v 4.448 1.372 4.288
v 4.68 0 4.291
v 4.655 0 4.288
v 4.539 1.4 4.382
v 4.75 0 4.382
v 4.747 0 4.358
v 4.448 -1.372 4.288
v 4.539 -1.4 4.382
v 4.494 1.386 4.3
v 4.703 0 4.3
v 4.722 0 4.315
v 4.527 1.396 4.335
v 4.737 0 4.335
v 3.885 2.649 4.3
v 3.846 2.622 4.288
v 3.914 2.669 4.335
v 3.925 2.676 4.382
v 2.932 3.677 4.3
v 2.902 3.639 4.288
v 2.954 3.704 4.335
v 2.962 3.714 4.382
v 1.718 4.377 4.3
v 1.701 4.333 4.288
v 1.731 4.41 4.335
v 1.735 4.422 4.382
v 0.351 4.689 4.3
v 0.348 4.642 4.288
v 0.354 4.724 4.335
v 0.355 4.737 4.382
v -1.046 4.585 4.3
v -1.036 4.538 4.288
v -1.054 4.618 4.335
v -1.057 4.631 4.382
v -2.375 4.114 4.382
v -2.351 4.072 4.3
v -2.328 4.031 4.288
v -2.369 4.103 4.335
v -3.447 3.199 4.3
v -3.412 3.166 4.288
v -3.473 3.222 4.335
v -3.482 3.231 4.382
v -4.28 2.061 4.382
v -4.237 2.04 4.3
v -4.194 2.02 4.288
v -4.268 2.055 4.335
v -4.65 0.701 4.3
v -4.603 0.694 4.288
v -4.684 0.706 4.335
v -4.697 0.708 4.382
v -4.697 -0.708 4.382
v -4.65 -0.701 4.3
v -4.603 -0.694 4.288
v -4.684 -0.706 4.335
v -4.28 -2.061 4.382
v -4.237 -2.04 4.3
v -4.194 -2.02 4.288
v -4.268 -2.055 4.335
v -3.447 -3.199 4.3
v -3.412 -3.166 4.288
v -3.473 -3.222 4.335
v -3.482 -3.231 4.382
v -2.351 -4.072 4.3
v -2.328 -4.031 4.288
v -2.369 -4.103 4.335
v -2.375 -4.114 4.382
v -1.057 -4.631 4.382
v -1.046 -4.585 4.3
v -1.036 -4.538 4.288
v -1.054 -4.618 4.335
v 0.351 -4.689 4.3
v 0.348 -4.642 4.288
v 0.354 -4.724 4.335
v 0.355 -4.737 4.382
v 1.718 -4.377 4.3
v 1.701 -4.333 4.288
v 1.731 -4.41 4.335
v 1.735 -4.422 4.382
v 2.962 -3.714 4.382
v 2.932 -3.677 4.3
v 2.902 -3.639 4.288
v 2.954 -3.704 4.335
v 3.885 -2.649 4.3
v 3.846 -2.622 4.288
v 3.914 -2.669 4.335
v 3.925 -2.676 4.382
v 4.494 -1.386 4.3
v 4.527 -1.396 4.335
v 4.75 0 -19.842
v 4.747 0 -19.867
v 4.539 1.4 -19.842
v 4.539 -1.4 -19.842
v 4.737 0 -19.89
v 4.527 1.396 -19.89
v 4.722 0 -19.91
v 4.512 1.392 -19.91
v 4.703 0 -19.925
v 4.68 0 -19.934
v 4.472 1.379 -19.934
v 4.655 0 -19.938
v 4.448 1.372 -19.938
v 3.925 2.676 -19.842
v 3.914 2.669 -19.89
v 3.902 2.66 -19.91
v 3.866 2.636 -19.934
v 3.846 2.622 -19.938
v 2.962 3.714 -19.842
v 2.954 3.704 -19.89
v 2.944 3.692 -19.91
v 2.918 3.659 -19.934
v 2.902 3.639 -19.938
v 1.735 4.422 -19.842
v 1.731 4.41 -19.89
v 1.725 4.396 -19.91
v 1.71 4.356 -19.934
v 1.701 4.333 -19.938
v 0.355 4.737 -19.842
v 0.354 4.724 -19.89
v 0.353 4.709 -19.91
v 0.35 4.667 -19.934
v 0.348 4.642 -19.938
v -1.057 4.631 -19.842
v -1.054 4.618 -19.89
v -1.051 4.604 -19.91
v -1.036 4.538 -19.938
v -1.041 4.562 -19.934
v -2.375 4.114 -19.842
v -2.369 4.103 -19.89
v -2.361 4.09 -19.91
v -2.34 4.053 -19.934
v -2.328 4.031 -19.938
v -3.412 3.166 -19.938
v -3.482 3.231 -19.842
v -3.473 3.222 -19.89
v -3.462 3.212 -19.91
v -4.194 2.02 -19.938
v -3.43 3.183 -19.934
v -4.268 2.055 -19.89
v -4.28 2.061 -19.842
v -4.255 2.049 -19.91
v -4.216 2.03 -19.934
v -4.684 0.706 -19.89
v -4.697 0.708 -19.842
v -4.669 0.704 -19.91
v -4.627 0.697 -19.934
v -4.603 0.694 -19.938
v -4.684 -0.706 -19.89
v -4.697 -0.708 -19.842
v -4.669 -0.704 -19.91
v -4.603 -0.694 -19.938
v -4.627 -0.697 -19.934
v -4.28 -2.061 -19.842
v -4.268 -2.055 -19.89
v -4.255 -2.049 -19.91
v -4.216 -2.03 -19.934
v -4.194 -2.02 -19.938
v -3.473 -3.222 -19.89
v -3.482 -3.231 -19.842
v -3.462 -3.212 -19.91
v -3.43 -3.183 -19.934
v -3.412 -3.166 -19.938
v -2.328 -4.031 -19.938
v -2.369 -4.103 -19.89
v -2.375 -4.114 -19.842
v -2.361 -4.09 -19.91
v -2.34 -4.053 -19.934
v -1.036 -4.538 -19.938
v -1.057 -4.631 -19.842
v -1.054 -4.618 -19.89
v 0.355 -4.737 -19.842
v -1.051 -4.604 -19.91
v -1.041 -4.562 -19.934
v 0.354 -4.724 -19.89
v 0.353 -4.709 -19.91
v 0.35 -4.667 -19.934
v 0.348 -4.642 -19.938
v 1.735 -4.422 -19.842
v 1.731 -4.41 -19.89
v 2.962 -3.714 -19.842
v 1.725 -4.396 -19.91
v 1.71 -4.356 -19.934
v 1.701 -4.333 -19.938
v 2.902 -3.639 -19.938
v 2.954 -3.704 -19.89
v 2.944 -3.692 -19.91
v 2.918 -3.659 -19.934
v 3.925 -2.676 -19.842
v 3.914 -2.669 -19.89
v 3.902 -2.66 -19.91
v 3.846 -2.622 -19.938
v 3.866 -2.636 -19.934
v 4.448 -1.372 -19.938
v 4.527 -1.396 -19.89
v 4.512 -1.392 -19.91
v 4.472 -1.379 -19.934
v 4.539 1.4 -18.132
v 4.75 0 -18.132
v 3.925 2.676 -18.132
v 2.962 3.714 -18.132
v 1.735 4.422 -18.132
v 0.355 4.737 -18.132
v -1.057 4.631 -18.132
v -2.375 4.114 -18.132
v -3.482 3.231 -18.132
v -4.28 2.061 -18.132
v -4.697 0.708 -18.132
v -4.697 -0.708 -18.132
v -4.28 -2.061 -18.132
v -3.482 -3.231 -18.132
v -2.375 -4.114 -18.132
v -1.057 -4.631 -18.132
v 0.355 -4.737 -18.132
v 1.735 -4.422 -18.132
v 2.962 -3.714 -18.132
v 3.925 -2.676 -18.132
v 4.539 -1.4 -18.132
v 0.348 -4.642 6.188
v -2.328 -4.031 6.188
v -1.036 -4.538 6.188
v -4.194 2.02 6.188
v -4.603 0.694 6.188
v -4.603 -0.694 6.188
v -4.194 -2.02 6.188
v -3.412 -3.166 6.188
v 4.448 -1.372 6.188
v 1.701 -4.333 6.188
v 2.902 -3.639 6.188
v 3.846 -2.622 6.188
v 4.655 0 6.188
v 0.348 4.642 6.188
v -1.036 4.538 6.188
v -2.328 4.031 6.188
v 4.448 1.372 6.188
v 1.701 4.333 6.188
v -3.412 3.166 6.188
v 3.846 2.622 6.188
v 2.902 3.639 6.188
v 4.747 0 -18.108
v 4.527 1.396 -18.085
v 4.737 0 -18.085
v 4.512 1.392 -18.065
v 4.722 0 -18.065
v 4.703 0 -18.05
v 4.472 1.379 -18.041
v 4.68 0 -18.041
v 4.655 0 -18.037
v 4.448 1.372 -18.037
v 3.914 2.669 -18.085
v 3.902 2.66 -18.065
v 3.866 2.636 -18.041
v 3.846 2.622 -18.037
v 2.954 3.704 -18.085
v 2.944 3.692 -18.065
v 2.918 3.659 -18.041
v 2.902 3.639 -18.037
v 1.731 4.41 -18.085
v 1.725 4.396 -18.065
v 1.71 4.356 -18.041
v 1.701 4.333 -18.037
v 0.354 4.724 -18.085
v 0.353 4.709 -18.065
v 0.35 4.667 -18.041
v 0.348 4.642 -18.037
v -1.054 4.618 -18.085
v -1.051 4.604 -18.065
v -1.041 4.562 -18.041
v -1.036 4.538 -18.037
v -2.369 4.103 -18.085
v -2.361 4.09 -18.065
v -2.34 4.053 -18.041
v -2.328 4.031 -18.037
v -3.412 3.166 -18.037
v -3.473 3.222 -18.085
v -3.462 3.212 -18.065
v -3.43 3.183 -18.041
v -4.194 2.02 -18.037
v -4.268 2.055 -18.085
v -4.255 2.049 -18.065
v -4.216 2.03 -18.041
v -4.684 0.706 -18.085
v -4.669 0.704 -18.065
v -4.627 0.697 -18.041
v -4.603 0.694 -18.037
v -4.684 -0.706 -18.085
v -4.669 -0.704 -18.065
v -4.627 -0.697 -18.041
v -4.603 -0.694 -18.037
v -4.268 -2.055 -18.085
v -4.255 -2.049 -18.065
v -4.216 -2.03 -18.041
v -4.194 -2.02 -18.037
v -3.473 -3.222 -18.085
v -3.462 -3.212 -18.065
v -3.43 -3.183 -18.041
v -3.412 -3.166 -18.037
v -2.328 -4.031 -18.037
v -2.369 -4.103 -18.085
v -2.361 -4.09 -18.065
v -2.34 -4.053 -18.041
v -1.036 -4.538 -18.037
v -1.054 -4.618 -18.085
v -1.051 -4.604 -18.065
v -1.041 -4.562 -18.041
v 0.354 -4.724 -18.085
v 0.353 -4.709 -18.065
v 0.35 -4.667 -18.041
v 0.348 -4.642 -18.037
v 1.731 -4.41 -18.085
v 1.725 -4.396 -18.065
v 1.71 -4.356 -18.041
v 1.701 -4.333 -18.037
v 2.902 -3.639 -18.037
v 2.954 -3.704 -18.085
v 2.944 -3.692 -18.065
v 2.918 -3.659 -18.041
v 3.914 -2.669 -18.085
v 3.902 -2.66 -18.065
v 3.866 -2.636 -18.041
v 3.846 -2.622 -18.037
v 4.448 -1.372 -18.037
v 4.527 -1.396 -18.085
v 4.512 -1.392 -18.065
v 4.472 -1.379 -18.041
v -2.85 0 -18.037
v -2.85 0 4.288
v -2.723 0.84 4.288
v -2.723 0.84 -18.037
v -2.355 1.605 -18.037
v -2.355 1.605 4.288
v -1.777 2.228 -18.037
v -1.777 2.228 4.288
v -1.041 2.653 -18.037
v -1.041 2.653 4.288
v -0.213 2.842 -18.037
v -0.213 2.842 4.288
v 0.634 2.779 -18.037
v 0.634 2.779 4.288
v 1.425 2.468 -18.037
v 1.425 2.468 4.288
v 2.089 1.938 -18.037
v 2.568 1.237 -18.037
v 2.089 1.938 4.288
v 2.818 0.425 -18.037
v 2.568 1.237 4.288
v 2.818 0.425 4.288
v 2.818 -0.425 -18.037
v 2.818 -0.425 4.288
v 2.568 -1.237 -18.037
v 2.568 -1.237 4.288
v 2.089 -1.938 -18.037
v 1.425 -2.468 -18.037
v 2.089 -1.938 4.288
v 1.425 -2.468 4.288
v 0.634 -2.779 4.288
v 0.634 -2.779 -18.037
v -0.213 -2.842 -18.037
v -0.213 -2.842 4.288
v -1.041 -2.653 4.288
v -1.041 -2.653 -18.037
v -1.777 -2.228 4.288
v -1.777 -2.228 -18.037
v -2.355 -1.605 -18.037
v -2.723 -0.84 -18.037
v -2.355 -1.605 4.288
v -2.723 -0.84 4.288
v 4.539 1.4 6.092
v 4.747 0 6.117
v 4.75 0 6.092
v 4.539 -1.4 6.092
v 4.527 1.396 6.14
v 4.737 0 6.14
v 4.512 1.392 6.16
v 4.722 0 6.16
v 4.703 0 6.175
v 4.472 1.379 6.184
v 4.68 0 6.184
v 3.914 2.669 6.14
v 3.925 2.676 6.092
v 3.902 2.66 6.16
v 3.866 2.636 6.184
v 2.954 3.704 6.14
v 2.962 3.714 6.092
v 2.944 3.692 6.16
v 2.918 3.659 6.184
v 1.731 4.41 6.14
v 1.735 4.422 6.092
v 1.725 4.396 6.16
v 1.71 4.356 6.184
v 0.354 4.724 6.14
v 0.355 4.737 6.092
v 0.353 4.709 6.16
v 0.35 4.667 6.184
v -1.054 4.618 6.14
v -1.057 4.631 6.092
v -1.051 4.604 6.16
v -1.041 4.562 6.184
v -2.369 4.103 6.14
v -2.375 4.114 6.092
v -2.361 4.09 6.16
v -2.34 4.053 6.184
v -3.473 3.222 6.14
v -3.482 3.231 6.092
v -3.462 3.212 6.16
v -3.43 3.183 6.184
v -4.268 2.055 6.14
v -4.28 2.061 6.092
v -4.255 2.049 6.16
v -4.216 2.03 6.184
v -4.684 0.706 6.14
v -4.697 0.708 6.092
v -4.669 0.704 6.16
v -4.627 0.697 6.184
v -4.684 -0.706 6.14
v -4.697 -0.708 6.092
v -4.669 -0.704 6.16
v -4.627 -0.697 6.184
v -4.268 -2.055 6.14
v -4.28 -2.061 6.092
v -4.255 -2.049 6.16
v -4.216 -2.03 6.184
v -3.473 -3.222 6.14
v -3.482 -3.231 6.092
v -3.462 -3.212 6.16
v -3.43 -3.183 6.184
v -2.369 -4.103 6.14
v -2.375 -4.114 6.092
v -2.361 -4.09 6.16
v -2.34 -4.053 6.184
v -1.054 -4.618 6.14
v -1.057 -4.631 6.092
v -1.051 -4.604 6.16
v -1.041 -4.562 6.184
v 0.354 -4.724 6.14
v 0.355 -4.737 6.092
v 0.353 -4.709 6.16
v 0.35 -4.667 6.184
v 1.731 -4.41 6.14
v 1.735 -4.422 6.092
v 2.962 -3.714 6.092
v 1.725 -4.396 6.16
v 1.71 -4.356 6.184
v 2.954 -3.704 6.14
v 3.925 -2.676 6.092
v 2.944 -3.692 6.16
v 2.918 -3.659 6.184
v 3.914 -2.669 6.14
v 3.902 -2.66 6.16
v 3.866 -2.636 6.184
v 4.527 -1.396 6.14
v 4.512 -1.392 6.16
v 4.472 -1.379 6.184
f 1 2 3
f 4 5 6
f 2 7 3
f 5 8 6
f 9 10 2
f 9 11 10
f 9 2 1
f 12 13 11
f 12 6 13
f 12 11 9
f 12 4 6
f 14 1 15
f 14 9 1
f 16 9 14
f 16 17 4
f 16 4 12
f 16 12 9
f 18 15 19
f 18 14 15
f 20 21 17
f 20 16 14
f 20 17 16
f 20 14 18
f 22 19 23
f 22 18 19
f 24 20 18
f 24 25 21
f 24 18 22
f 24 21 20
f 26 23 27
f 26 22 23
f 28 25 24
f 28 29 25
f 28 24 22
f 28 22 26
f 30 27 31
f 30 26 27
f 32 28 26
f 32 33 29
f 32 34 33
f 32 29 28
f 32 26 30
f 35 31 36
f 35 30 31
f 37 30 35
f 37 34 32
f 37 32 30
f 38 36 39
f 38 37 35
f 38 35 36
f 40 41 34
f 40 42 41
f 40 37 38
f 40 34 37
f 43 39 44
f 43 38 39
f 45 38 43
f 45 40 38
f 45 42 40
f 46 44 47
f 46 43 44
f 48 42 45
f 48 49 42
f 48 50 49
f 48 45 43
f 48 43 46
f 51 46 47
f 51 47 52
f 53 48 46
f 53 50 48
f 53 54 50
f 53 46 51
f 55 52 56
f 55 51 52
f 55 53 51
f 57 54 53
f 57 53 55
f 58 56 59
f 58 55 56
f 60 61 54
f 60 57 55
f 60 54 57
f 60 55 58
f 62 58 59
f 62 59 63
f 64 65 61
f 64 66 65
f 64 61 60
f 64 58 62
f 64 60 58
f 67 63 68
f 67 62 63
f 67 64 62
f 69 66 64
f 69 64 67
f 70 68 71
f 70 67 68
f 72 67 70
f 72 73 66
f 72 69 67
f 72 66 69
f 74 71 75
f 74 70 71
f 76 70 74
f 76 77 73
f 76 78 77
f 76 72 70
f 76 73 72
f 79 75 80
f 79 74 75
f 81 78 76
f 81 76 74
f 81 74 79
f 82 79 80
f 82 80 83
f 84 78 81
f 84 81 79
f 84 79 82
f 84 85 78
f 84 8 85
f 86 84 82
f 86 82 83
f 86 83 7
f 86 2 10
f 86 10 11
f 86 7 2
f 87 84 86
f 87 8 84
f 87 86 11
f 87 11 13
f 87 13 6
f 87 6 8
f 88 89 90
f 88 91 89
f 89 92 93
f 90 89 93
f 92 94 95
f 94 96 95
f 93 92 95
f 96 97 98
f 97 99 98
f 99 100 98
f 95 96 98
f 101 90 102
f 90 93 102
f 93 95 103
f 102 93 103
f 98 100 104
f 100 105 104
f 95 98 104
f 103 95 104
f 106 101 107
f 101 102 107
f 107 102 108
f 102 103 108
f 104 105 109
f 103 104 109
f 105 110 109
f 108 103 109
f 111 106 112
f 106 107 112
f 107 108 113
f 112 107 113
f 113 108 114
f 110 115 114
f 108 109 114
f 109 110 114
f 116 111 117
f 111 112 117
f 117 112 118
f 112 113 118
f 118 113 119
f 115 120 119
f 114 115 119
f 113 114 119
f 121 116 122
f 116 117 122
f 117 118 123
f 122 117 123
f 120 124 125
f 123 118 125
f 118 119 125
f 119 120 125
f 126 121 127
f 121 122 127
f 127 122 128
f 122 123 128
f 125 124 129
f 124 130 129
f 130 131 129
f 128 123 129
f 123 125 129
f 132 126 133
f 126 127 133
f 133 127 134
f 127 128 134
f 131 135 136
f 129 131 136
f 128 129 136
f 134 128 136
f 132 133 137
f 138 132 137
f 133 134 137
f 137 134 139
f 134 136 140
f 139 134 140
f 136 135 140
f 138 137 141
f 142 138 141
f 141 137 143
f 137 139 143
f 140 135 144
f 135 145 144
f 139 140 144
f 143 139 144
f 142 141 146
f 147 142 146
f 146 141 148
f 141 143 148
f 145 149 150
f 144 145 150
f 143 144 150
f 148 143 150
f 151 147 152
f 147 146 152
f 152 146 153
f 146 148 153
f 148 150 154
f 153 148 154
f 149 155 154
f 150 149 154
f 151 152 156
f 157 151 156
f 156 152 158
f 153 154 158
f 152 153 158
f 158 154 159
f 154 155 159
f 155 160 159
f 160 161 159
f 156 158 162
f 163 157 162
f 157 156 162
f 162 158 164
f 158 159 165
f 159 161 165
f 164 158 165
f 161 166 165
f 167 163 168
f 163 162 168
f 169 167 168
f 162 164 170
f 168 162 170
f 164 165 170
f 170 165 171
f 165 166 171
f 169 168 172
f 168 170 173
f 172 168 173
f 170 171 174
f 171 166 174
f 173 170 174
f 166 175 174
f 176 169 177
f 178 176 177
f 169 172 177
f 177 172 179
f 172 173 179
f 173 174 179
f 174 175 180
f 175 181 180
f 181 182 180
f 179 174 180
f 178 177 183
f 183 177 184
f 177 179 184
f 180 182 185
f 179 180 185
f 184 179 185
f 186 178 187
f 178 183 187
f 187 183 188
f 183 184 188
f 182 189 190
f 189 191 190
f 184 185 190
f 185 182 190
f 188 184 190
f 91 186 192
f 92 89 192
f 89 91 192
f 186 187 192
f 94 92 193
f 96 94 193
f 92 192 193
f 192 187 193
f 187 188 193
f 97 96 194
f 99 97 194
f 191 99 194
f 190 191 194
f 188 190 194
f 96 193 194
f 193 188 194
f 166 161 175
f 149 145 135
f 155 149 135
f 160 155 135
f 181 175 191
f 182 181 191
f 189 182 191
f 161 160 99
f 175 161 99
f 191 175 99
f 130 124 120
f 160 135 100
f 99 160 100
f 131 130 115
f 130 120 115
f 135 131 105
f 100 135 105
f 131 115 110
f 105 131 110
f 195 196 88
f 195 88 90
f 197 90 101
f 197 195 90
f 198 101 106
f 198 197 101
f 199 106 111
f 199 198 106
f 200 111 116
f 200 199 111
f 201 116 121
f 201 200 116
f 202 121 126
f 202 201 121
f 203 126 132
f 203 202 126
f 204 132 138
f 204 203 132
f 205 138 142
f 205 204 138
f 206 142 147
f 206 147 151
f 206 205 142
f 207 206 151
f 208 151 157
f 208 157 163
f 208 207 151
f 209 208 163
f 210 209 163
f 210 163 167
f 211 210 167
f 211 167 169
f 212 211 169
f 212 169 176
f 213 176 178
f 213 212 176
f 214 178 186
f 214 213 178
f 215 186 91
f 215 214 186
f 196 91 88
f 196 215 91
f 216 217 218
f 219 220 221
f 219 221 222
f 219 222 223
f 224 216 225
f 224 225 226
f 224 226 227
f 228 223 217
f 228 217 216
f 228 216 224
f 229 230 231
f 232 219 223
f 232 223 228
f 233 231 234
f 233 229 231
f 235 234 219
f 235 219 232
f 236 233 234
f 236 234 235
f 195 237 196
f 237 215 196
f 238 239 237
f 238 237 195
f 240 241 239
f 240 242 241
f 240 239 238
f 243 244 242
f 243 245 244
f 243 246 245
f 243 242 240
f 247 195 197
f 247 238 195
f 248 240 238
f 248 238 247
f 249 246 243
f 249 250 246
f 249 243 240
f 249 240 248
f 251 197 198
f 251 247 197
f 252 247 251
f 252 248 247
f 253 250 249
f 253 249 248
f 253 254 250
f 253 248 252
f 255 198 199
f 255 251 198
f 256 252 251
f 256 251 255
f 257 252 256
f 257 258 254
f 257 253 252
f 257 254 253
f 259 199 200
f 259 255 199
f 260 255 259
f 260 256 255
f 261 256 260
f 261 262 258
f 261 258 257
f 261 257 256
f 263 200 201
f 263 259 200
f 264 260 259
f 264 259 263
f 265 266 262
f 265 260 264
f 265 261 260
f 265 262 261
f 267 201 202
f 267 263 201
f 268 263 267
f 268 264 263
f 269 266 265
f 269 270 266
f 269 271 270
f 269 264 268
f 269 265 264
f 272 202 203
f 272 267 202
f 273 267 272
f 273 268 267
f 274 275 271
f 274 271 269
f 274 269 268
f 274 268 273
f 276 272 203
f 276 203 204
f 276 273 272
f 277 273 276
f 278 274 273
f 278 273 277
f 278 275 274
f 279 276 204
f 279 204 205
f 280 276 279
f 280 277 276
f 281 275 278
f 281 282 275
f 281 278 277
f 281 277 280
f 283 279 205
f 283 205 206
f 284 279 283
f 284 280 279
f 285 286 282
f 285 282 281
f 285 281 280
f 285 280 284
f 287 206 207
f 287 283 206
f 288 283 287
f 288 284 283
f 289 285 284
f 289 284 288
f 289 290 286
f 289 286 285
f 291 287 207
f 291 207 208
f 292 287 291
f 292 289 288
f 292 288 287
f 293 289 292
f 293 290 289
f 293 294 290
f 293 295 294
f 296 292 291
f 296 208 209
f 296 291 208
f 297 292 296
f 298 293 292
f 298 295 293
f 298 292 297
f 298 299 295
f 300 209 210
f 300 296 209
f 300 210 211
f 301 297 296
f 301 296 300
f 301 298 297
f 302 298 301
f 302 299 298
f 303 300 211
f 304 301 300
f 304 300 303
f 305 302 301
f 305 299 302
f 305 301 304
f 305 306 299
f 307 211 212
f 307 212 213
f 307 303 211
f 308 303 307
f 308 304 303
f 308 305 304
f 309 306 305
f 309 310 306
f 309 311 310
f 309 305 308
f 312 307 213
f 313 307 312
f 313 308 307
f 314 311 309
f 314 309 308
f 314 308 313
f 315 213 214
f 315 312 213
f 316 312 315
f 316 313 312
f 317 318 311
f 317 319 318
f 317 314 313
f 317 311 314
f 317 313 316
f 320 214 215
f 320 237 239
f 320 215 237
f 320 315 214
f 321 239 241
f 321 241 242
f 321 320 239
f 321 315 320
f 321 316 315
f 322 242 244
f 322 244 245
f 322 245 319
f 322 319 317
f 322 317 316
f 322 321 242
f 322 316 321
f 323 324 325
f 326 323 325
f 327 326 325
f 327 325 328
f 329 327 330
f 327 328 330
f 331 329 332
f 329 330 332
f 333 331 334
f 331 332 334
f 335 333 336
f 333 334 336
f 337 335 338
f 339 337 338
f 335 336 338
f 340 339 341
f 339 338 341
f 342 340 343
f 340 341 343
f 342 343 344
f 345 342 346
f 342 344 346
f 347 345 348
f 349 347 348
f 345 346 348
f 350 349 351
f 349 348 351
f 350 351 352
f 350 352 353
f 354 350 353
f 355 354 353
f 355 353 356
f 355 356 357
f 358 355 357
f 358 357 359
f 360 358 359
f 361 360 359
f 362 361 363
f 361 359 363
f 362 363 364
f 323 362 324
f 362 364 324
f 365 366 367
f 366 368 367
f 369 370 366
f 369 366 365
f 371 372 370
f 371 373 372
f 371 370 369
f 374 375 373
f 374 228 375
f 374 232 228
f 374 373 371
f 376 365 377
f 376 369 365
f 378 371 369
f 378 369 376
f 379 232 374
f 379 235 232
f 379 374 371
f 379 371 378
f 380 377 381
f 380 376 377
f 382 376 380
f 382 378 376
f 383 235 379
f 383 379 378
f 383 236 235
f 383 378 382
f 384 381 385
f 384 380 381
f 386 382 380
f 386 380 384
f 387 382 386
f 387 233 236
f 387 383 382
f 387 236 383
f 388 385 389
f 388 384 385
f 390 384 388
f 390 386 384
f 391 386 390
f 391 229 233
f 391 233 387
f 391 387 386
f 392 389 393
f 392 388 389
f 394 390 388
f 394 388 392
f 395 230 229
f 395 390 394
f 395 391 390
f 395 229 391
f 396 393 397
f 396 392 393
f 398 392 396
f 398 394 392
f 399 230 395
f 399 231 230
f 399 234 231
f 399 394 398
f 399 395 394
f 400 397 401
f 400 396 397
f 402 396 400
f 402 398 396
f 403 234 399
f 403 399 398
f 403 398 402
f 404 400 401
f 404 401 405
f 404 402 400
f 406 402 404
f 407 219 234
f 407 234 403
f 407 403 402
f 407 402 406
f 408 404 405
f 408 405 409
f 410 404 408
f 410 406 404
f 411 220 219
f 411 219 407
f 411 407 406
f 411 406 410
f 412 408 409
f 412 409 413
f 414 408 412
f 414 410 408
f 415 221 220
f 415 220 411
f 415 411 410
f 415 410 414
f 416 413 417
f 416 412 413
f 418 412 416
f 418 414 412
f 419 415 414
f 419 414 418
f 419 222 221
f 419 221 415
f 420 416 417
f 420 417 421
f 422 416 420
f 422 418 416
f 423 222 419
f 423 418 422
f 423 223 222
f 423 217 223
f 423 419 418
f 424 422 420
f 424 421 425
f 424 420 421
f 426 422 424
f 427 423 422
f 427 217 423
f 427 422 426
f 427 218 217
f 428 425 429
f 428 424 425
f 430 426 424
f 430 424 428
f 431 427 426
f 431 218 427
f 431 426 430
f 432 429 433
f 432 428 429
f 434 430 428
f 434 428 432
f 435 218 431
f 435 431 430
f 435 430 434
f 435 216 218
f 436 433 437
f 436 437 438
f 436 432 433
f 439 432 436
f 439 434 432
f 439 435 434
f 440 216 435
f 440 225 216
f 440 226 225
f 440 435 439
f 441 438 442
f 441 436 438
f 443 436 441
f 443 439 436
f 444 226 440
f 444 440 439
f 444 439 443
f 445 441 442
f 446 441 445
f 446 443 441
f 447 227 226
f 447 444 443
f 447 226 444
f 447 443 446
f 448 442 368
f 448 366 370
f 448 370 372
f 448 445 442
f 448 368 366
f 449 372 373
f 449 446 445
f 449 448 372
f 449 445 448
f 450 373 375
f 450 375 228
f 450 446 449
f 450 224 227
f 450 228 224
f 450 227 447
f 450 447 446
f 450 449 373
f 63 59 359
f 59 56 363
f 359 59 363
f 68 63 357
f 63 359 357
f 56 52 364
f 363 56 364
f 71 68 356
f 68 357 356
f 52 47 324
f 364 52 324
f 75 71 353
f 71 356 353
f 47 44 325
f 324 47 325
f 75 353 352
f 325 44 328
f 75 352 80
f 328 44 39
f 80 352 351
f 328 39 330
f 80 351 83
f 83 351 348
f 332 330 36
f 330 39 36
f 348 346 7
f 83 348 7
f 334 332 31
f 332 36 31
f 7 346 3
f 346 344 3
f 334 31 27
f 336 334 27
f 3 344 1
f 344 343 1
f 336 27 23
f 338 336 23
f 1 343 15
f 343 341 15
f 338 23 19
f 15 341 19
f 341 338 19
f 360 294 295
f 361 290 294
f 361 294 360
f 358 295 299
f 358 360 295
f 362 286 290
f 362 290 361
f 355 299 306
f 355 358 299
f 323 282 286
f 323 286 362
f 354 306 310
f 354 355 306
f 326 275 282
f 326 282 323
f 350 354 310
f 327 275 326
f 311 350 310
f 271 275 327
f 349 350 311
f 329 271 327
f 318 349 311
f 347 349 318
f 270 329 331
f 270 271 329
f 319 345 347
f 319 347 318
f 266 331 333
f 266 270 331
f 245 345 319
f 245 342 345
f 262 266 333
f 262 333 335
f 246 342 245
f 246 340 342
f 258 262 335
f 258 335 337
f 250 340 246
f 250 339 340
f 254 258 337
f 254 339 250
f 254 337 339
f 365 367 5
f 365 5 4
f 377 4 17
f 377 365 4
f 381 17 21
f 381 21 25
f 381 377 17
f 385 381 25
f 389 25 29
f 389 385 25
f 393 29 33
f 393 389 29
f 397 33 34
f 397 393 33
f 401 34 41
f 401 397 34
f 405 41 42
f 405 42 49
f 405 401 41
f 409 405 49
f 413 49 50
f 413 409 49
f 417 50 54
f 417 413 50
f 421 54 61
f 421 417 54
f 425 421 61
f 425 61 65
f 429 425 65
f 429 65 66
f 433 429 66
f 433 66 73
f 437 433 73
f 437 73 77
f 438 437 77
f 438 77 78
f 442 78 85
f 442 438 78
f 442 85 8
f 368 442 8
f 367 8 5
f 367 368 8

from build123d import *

# Parameters (mm, degrees)
SKETCH1_R           = 2.5
BOSS_EXTRUDE1_DEPTH = 1
SKETCH2_R           = 1.5
BOSS_EXTRUDE2_DEPTH = 11.75
BOSS_EXTRUDE3_START = -12.75
SKETCH1_5_R         = 2.5
BOSS_EXTRUDE3_DEPTH = 1
FILLET1_R           = 0.05
SCALE1_SCALE        = 1.9


with BuildPart() as part:
    # Sketch1 → Boss-Extrude1 (new body)
    with BuildSketch(Plane.XY):
        Circle(SKETCH1_R)
    extrude(amount=-BOSS_EXTRUDE1_DEPTH)

    # Sketch2 → Boss-Extrude2 (add)
    with BuildSketch(Plane(origin=(0, 0, -1), x_dir=(-1, 0, 0), z_dir=(0, 0, -1))):
        Circle(SKETCH2_R)
    extrude(amount=BOSS_EXTRUDE2_DEPTH)

    # Sketch1<5> → Boss-Extrude3 (add)
    with BuildSketch(Plane.XY.offset(BOSS_EXTRUDE3_START)):
        Circle(SKETCH1_5_R)
    extrude(amount=-BOSS_EXTRUDE3_DEPTH)

    # Fillet1
    fillet1_edges = [part.edges().sort_by_distance(p)[0] for p in [
        (-2.5, 0, 0),
        (-2.5, 0, -1),
        (-2.5, 0, -12.75),
        (-2.5, 0, -13.75),
    ]]
    fillet(fillet1_edges, radius=FILLET1_R)


with BuildPart() as part_1:
    # Scale1: scaled about (0, 0, -6.875)
    add(part.part.scale(SCALE1_SCALE).moved(Location((0, 0, 6.1875))))


solid = part_1.part
